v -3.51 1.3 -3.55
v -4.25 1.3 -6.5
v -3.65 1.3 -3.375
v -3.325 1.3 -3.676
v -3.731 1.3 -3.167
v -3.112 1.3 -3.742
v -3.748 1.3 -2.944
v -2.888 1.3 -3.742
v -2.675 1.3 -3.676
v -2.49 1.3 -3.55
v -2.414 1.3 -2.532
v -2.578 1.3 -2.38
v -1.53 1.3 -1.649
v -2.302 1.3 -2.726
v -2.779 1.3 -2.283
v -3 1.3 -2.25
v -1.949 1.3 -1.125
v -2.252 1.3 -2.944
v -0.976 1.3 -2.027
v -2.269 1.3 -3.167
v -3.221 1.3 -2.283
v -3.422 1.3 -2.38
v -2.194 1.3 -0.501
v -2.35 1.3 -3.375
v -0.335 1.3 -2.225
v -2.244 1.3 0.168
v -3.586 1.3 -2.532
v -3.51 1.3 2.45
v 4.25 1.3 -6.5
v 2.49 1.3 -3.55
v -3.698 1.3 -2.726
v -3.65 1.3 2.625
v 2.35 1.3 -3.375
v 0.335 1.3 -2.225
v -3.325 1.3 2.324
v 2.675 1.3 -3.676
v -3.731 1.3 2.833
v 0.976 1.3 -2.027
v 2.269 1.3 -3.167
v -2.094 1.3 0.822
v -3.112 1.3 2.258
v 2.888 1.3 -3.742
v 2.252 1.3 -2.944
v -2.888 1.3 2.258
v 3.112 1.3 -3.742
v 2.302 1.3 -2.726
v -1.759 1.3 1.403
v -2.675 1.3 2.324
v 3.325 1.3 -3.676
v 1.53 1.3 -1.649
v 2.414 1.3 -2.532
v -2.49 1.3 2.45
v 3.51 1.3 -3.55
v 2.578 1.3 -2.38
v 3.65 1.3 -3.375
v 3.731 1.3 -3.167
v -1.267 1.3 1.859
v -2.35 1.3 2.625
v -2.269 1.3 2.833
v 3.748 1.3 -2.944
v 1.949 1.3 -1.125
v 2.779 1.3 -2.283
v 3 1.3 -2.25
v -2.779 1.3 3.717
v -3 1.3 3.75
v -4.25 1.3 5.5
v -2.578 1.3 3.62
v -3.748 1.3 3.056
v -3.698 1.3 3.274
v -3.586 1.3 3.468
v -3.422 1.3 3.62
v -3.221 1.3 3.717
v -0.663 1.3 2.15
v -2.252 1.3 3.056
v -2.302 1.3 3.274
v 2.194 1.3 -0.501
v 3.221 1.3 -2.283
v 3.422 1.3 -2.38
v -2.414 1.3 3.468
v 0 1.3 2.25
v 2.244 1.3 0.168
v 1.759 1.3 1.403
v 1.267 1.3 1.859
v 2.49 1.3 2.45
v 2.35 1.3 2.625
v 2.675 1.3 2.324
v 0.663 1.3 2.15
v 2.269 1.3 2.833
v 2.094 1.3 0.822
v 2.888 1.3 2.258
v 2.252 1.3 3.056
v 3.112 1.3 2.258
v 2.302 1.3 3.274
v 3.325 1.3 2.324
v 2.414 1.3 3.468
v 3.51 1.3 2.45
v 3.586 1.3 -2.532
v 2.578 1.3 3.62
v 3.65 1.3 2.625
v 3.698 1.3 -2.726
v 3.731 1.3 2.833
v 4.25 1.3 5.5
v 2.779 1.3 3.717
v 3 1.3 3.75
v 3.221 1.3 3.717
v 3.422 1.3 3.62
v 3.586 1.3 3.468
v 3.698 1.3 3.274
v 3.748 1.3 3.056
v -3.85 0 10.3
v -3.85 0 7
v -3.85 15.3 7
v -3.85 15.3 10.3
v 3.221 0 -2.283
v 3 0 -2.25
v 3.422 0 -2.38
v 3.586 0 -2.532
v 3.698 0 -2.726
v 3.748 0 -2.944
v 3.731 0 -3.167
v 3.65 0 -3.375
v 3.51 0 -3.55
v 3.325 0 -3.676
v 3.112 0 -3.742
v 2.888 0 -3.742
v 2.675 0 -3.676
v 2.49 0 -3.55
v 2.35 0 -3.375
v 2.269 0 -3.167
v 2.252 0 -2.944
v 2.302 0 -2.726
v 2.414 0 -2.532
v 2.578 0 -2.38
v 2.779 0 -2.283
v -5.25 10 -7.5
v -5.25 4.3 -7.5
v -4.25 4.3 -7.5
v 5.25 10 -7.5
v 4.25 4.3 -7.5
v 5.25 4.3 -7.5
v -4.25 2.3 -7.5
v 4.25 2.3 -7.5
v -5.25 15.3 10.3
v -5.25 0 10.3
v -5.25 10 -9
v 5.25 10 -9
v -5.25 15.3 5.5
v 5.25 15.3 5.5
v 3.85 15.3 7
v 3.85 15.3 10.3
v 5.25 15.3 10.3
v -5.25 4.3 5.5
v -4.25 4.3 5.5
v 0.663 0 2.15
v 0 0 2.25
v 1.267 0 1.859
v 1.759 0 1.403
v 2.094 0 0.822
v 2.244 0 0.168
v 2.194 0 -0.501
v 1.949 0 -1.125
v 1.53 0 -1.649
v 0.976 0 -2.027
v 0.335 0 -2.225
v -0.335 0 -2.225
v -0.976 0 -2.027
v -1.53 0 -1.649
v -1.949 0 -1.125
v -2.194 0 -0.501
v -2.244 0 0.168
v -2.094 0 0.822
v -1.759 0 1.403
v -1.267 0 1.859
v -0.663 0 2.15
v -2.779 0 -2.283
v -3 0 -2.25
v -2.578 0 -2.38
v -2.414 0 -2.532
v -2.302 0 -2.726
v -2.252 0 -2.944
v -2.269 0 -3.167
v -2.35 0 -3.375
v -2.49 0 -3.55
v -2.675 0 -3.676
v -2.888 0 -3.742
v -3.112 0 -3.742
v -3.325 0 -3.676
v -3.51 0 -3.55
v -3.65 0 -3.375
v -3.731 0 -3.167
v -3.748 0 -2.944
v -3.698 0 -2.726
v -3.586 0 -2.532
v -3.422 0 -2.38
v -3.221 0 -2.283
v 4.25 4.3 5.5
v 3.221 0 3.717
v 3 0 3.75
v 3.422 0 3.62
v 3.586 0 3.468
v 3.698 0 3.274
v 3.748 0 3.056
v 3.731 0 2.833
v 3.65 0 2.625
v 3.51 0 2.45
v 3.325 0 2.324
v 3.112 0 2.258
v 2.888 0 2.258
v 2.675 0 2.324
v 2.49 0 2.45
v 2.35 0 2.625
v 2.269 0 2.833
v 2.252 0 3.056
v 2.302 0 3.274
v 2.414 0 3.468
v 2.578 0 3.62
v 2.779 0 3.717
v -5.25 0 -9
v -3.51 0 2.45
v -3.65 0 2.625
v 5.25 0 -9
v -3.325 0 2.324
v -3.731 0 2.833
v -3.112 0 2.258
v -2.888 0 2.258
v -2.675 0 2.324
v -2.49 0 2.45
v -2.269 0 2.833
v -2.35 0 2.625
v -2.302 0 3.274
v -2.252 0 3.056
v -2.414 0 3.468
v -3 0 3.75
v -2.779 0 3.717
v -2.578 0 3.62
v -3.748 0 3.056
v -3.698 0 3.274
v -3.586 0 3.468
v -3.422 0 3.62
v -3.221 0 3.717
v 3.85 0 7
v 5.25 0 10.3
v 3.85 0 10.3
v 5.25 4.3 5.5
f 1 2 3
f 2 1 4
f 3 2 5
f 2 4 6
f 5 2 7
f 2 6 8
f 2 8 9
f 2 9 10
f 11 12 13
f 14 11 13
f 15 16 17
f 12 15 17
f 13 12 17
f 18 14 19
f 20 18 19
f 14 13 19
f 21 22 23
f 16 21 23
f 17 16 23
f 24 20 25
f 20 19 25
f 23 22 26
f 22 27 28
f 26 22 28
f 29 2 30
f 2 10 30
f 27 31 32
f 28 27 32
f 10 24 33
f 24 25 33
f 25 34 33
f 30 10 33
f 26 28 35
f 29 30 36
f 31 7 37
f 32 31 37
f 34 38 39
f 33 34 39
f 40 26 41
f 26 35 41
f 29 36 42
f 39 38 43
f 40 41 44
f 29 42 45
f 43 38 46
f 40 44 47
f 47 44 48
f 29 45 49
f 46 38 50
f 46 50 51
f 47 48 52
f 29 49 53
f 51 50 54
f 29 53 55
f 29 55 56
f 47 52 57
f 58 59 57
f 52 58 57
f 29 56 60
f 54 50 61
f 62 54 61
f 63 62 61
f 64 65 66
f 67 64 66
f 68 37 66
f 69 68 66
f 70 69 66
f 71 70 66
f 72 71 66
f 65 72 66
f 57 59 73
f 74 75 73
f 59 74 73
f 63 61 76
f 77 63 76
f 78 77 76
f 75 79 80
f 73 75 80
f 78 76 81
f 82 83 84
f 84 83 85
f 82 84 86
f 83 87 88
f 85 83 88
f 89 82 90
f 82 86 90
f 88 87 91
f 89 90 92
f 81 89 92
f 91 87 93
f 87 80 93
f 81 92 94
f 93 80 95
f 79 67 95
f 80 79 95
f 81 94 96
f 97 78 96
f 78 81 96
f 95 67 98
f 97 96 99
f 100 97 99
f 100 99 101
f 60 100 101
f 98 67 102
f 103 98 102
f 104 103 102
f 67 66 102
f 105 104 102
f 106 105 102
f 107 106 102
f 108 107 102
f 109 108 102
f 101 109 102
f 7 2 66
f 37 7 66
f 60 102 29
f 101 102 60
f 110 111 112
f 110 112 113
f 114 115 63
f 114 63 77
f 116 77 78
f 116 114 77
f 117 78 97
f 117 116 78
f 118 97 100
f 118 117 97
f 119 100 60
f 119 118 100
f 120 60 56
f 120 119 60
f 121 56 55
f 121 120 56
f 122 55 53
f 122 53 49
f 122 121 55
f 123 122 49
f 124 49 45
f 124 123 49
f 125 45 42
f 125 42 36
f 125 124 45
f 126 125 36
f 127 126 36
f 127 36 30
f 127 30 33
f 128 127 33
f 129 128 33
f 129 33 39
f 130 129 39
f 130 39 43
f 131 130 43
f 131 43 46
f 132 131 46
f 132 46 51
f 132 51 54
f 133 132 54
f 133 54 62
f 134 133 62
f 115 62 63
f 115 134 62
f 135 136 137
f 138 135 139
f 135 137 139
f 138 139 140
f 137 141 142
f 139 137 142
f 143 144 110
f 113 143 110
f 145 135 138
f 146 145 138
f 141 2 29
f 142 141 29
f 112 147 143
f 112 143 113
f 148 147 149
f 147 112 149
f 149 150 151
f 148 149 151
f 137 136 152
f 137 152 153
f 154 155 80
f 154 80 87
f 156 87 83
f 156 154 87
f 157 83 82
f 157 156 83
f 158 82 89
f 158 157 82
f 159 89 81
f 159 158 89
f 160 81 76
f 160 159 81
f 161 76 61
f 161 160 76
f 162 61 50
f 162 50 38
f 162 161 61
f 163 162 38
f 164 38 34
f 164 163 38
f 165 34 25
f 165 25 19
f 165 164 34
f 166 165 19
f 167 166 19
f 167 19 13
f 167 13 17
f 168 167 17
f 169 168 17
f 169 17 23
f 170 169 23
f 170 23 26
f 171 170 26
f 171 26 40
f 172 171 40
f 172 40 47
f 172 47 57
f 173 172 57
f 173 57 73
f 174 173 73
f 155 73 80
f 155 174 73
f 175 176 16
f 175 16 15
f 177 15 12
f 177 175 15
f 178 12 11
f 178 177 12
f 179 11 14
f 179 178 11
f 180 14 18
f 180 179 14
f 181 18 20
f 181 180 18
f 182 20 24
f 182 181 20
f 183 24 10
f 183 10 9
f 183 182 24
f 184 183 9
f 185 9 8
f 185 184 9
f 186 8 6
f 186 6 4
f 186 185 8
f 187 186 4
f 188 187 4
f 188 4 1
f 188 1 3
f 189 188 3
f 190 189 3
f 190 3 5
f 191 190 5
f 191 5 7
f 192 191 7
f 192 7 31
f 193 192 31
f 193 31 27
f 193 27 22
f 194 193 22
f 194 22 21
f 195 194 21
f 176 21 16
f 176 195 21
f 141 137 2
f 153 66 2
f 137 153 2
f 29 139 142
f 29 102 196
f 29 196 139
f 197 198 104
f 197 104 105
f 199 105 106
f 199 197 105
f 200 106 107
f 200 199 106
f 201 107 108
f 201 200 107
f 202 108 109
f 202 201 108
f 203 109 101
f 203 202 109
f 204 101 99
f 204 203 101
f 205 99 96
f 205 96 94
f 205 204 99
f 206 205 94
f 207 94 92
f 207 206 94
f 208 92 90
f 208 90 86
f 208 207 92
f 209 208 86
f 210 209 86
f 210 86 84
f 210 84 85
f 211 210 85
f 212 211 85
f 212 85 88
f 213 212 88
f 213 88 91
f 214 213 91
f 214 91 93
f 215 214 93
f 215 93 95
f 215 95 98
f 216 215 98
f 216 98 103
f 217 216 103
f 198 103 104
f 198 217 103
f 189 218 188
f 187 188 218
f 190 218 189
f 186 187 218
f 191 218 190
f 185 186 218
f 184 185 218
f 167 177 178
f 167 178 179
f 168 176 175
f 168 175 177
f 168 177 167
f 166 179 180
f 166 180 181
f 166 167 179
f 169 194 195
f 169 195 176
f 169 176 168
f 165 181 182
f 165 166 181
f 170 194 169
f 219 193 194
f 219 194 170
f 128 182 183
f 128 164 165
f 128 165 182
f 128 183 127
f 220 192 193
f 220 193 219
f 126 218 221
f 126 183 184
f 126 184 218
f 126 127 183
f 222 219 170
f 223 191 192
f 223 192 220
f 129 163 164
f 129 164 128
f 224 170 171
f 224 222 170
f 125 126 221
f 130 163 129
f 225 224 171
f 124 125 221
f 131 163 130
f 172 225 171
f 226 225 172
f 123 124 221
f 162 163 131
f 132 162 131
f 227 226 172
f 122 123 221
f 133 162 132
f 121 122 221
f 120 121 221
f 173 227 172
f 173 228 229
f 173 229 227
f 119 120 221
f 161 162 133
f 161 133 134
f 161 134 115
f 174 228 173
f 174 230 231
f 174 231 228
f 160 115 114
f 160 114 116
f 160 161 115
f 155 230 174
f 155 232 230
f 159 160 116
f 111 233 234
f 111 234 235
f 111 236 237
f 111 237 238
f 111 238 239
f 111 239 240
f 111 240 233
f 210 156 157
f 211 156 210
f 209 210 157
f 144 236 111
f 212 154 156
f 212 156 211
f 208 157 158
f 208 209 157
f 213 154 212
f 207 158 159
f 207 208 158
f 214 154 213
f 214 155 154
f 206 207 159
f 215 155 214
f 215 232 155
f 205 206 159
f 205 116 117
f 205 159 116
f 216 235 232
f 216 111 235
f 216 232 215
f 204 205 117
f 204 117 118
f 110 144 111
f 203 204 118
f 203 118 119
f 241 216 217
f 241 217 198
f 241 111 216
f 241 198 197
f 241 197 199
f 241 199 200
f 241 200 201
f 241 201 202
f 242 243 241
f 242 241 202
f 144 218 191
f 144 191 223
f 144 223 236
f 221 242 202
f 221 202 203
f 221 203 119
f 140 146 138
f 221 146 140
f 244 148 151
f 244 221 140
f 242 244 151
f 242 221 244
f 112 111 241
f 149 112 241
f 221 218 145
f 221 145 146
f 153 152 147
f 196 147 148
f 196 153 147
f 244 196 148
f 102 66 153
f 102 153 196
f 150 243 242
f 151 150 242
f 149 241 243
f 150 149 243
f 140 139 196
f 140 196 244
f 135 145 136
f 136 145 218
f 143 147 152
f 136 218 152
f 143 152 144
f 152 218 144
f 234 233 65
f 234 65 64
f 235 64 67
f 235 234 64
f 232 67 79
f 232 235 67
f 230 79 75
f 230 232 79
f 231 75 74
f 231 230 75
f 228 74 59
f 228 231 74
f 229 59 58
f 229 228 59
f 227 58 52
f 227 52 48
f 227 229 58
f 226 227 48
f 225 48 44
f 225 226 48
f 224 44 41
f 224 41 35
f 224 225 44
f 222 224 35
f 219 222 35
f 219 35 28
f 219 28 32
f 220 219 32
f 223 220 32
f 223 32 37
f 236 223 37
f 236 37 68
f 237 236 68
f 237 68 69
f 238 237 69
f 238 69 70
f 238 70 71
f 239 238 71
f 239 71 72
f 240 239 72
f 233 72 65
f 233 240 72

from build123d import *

# Parameters (mm, degrees)
SKETCH1_W           = 10.5
SKETCH1_H           = 14
SKETCH1_R           = 0.75
SKETCH1_R_2         = 2.25
BOSS_EXTRUDE1_DEPTH = 1.3
SKETCH2_W           = 10.5
SKETCH2_H           = 1.5
BOSS_EXTRUDE2_DEPTH = 14
SKETCH3_W           = 1.4
SKETCH3_H           = 3.3
BOSS_EXTRUDE3_DEPTH = 15.3
SKETCH4_W           = 10.5
SKETCH4_H           = 0.5
BOSS_EXTRUDE4_DEPTH = 1.3
SKETCH5_W           = 10.5
SKETCH5_H           = 1.5
BOSS_EXTRUDE5_DEPTH = 10
SKETCH6_W           = 1
SKETCH6_H           = 13
BOSS_EXTRUDE6_DEPTH = 3
CHAMFER1_SIZE       = 1


with BuildPart() as part:
    # Sketch1 → Boss-Extrude1 (new body)
    with BuildSketch(Plane(origin=(0, 0, 0), x_dir=(1, 0, 0), z_dir=(0, 1, 0))):
        Rectangle(SKETCH1_W, SKETCH1_H)
        with Locations(Location((-3, 3, 0), (0, 0, 270))):
            Circle(SKETCH1_R, mode=Mode.SUBTRACT)
        with Locations(Location((3, 3, 0), (0, 0, 270))):
            Circle(SKETCH1_R, mode=Mode.SUBTRACT)
        with Locations(Location((-3, -3, 0), (0, 0, 270))):
            Circle(SKETCH1_R, mode=Mode.SUBTRACT)
        with Locations(Location((3, -3, 0), (0, 0, 270))):
            Circle(SKETCH1_R, mode=Mode.SUBTRACT)
        with Locations(Location((0, 0, 0), (0, 0, 270))):
            Circle(SKETCH1_R_2, mode=Mode.SUBTRACT)
    extrude(amount=BOSS_EXTRUDE1_DEPTH)

    # Sketch2 → Boss-Extrude2 (add)
    with BuildSketch(Plane(origin=(0, 1.3, 0), x_dir=(1, 0, 0), z_dir=(0, 1, 0))):
        with Locations((0, -6.25)):
            Rectangle(SKETCH2_W, SKETCH2_H)
    extrude(amount=BOSS_EXTRUDE2_DEPTH)

    # Sketch3 → Boss-Extrude3 (add)
    with BuildSketch(Plane.XZ):
        with Locations((-4.55, 8.65)):
            Rectangle(SKETCH3_W, SKETCH3_H)
        with Locations((4.55, 8.65)):
            Rectangle(SKETCH3_W, SKETCH3_H)
    extrude(amount=-BOSS_EXTRUDE3_DEPTH)

    # Sketch4 → Boss-Extrude4 (add)
    with BuildSketch(Plane.XZ):
        with Locations((0, -7.25)):
            Rectangle(SKETCH4_W, SKETCH4_H)
    extrude(amount=-BOSS_EXTRUDE4_DEPTH)

    # Sketch5 → Boss-Extrude5 (add)
    with BuildSketch(Plane.XZ):
        with Locations((0, -8.25)):
            Rectangle(SKETCH5_W, SKETCH5_H)
    extrude(amount=-BOSS_EXTRUDE5_DEPTH)

    # Sketch6 → Boss-Extrude6 (add)
    with BuildSketch(Plane(origin=(0, 1.3, 0), x_dir=(1, 0, 0), z_dir=(0, 1, 0))):
        with Locations((4.75, 1)):
            Rectangle(SKETCH6_W, SKETCH6_H)
        with Locations((-4.75, 1)):
            Rectangle(SKETCH6_W, SKETCH6_H)
    extrude(amount=BOSS_EXTRUDE6_DEPTH)

    # Chamfer1
    chamfer1_edges = [part.edges().sort_by_distance(p)[0] for p in [
        (0, 1.3, -7.5),
    ]]
    chamfer(chamfer1_edges, length=CHAMFER1_SIZE)


solid = part.part
